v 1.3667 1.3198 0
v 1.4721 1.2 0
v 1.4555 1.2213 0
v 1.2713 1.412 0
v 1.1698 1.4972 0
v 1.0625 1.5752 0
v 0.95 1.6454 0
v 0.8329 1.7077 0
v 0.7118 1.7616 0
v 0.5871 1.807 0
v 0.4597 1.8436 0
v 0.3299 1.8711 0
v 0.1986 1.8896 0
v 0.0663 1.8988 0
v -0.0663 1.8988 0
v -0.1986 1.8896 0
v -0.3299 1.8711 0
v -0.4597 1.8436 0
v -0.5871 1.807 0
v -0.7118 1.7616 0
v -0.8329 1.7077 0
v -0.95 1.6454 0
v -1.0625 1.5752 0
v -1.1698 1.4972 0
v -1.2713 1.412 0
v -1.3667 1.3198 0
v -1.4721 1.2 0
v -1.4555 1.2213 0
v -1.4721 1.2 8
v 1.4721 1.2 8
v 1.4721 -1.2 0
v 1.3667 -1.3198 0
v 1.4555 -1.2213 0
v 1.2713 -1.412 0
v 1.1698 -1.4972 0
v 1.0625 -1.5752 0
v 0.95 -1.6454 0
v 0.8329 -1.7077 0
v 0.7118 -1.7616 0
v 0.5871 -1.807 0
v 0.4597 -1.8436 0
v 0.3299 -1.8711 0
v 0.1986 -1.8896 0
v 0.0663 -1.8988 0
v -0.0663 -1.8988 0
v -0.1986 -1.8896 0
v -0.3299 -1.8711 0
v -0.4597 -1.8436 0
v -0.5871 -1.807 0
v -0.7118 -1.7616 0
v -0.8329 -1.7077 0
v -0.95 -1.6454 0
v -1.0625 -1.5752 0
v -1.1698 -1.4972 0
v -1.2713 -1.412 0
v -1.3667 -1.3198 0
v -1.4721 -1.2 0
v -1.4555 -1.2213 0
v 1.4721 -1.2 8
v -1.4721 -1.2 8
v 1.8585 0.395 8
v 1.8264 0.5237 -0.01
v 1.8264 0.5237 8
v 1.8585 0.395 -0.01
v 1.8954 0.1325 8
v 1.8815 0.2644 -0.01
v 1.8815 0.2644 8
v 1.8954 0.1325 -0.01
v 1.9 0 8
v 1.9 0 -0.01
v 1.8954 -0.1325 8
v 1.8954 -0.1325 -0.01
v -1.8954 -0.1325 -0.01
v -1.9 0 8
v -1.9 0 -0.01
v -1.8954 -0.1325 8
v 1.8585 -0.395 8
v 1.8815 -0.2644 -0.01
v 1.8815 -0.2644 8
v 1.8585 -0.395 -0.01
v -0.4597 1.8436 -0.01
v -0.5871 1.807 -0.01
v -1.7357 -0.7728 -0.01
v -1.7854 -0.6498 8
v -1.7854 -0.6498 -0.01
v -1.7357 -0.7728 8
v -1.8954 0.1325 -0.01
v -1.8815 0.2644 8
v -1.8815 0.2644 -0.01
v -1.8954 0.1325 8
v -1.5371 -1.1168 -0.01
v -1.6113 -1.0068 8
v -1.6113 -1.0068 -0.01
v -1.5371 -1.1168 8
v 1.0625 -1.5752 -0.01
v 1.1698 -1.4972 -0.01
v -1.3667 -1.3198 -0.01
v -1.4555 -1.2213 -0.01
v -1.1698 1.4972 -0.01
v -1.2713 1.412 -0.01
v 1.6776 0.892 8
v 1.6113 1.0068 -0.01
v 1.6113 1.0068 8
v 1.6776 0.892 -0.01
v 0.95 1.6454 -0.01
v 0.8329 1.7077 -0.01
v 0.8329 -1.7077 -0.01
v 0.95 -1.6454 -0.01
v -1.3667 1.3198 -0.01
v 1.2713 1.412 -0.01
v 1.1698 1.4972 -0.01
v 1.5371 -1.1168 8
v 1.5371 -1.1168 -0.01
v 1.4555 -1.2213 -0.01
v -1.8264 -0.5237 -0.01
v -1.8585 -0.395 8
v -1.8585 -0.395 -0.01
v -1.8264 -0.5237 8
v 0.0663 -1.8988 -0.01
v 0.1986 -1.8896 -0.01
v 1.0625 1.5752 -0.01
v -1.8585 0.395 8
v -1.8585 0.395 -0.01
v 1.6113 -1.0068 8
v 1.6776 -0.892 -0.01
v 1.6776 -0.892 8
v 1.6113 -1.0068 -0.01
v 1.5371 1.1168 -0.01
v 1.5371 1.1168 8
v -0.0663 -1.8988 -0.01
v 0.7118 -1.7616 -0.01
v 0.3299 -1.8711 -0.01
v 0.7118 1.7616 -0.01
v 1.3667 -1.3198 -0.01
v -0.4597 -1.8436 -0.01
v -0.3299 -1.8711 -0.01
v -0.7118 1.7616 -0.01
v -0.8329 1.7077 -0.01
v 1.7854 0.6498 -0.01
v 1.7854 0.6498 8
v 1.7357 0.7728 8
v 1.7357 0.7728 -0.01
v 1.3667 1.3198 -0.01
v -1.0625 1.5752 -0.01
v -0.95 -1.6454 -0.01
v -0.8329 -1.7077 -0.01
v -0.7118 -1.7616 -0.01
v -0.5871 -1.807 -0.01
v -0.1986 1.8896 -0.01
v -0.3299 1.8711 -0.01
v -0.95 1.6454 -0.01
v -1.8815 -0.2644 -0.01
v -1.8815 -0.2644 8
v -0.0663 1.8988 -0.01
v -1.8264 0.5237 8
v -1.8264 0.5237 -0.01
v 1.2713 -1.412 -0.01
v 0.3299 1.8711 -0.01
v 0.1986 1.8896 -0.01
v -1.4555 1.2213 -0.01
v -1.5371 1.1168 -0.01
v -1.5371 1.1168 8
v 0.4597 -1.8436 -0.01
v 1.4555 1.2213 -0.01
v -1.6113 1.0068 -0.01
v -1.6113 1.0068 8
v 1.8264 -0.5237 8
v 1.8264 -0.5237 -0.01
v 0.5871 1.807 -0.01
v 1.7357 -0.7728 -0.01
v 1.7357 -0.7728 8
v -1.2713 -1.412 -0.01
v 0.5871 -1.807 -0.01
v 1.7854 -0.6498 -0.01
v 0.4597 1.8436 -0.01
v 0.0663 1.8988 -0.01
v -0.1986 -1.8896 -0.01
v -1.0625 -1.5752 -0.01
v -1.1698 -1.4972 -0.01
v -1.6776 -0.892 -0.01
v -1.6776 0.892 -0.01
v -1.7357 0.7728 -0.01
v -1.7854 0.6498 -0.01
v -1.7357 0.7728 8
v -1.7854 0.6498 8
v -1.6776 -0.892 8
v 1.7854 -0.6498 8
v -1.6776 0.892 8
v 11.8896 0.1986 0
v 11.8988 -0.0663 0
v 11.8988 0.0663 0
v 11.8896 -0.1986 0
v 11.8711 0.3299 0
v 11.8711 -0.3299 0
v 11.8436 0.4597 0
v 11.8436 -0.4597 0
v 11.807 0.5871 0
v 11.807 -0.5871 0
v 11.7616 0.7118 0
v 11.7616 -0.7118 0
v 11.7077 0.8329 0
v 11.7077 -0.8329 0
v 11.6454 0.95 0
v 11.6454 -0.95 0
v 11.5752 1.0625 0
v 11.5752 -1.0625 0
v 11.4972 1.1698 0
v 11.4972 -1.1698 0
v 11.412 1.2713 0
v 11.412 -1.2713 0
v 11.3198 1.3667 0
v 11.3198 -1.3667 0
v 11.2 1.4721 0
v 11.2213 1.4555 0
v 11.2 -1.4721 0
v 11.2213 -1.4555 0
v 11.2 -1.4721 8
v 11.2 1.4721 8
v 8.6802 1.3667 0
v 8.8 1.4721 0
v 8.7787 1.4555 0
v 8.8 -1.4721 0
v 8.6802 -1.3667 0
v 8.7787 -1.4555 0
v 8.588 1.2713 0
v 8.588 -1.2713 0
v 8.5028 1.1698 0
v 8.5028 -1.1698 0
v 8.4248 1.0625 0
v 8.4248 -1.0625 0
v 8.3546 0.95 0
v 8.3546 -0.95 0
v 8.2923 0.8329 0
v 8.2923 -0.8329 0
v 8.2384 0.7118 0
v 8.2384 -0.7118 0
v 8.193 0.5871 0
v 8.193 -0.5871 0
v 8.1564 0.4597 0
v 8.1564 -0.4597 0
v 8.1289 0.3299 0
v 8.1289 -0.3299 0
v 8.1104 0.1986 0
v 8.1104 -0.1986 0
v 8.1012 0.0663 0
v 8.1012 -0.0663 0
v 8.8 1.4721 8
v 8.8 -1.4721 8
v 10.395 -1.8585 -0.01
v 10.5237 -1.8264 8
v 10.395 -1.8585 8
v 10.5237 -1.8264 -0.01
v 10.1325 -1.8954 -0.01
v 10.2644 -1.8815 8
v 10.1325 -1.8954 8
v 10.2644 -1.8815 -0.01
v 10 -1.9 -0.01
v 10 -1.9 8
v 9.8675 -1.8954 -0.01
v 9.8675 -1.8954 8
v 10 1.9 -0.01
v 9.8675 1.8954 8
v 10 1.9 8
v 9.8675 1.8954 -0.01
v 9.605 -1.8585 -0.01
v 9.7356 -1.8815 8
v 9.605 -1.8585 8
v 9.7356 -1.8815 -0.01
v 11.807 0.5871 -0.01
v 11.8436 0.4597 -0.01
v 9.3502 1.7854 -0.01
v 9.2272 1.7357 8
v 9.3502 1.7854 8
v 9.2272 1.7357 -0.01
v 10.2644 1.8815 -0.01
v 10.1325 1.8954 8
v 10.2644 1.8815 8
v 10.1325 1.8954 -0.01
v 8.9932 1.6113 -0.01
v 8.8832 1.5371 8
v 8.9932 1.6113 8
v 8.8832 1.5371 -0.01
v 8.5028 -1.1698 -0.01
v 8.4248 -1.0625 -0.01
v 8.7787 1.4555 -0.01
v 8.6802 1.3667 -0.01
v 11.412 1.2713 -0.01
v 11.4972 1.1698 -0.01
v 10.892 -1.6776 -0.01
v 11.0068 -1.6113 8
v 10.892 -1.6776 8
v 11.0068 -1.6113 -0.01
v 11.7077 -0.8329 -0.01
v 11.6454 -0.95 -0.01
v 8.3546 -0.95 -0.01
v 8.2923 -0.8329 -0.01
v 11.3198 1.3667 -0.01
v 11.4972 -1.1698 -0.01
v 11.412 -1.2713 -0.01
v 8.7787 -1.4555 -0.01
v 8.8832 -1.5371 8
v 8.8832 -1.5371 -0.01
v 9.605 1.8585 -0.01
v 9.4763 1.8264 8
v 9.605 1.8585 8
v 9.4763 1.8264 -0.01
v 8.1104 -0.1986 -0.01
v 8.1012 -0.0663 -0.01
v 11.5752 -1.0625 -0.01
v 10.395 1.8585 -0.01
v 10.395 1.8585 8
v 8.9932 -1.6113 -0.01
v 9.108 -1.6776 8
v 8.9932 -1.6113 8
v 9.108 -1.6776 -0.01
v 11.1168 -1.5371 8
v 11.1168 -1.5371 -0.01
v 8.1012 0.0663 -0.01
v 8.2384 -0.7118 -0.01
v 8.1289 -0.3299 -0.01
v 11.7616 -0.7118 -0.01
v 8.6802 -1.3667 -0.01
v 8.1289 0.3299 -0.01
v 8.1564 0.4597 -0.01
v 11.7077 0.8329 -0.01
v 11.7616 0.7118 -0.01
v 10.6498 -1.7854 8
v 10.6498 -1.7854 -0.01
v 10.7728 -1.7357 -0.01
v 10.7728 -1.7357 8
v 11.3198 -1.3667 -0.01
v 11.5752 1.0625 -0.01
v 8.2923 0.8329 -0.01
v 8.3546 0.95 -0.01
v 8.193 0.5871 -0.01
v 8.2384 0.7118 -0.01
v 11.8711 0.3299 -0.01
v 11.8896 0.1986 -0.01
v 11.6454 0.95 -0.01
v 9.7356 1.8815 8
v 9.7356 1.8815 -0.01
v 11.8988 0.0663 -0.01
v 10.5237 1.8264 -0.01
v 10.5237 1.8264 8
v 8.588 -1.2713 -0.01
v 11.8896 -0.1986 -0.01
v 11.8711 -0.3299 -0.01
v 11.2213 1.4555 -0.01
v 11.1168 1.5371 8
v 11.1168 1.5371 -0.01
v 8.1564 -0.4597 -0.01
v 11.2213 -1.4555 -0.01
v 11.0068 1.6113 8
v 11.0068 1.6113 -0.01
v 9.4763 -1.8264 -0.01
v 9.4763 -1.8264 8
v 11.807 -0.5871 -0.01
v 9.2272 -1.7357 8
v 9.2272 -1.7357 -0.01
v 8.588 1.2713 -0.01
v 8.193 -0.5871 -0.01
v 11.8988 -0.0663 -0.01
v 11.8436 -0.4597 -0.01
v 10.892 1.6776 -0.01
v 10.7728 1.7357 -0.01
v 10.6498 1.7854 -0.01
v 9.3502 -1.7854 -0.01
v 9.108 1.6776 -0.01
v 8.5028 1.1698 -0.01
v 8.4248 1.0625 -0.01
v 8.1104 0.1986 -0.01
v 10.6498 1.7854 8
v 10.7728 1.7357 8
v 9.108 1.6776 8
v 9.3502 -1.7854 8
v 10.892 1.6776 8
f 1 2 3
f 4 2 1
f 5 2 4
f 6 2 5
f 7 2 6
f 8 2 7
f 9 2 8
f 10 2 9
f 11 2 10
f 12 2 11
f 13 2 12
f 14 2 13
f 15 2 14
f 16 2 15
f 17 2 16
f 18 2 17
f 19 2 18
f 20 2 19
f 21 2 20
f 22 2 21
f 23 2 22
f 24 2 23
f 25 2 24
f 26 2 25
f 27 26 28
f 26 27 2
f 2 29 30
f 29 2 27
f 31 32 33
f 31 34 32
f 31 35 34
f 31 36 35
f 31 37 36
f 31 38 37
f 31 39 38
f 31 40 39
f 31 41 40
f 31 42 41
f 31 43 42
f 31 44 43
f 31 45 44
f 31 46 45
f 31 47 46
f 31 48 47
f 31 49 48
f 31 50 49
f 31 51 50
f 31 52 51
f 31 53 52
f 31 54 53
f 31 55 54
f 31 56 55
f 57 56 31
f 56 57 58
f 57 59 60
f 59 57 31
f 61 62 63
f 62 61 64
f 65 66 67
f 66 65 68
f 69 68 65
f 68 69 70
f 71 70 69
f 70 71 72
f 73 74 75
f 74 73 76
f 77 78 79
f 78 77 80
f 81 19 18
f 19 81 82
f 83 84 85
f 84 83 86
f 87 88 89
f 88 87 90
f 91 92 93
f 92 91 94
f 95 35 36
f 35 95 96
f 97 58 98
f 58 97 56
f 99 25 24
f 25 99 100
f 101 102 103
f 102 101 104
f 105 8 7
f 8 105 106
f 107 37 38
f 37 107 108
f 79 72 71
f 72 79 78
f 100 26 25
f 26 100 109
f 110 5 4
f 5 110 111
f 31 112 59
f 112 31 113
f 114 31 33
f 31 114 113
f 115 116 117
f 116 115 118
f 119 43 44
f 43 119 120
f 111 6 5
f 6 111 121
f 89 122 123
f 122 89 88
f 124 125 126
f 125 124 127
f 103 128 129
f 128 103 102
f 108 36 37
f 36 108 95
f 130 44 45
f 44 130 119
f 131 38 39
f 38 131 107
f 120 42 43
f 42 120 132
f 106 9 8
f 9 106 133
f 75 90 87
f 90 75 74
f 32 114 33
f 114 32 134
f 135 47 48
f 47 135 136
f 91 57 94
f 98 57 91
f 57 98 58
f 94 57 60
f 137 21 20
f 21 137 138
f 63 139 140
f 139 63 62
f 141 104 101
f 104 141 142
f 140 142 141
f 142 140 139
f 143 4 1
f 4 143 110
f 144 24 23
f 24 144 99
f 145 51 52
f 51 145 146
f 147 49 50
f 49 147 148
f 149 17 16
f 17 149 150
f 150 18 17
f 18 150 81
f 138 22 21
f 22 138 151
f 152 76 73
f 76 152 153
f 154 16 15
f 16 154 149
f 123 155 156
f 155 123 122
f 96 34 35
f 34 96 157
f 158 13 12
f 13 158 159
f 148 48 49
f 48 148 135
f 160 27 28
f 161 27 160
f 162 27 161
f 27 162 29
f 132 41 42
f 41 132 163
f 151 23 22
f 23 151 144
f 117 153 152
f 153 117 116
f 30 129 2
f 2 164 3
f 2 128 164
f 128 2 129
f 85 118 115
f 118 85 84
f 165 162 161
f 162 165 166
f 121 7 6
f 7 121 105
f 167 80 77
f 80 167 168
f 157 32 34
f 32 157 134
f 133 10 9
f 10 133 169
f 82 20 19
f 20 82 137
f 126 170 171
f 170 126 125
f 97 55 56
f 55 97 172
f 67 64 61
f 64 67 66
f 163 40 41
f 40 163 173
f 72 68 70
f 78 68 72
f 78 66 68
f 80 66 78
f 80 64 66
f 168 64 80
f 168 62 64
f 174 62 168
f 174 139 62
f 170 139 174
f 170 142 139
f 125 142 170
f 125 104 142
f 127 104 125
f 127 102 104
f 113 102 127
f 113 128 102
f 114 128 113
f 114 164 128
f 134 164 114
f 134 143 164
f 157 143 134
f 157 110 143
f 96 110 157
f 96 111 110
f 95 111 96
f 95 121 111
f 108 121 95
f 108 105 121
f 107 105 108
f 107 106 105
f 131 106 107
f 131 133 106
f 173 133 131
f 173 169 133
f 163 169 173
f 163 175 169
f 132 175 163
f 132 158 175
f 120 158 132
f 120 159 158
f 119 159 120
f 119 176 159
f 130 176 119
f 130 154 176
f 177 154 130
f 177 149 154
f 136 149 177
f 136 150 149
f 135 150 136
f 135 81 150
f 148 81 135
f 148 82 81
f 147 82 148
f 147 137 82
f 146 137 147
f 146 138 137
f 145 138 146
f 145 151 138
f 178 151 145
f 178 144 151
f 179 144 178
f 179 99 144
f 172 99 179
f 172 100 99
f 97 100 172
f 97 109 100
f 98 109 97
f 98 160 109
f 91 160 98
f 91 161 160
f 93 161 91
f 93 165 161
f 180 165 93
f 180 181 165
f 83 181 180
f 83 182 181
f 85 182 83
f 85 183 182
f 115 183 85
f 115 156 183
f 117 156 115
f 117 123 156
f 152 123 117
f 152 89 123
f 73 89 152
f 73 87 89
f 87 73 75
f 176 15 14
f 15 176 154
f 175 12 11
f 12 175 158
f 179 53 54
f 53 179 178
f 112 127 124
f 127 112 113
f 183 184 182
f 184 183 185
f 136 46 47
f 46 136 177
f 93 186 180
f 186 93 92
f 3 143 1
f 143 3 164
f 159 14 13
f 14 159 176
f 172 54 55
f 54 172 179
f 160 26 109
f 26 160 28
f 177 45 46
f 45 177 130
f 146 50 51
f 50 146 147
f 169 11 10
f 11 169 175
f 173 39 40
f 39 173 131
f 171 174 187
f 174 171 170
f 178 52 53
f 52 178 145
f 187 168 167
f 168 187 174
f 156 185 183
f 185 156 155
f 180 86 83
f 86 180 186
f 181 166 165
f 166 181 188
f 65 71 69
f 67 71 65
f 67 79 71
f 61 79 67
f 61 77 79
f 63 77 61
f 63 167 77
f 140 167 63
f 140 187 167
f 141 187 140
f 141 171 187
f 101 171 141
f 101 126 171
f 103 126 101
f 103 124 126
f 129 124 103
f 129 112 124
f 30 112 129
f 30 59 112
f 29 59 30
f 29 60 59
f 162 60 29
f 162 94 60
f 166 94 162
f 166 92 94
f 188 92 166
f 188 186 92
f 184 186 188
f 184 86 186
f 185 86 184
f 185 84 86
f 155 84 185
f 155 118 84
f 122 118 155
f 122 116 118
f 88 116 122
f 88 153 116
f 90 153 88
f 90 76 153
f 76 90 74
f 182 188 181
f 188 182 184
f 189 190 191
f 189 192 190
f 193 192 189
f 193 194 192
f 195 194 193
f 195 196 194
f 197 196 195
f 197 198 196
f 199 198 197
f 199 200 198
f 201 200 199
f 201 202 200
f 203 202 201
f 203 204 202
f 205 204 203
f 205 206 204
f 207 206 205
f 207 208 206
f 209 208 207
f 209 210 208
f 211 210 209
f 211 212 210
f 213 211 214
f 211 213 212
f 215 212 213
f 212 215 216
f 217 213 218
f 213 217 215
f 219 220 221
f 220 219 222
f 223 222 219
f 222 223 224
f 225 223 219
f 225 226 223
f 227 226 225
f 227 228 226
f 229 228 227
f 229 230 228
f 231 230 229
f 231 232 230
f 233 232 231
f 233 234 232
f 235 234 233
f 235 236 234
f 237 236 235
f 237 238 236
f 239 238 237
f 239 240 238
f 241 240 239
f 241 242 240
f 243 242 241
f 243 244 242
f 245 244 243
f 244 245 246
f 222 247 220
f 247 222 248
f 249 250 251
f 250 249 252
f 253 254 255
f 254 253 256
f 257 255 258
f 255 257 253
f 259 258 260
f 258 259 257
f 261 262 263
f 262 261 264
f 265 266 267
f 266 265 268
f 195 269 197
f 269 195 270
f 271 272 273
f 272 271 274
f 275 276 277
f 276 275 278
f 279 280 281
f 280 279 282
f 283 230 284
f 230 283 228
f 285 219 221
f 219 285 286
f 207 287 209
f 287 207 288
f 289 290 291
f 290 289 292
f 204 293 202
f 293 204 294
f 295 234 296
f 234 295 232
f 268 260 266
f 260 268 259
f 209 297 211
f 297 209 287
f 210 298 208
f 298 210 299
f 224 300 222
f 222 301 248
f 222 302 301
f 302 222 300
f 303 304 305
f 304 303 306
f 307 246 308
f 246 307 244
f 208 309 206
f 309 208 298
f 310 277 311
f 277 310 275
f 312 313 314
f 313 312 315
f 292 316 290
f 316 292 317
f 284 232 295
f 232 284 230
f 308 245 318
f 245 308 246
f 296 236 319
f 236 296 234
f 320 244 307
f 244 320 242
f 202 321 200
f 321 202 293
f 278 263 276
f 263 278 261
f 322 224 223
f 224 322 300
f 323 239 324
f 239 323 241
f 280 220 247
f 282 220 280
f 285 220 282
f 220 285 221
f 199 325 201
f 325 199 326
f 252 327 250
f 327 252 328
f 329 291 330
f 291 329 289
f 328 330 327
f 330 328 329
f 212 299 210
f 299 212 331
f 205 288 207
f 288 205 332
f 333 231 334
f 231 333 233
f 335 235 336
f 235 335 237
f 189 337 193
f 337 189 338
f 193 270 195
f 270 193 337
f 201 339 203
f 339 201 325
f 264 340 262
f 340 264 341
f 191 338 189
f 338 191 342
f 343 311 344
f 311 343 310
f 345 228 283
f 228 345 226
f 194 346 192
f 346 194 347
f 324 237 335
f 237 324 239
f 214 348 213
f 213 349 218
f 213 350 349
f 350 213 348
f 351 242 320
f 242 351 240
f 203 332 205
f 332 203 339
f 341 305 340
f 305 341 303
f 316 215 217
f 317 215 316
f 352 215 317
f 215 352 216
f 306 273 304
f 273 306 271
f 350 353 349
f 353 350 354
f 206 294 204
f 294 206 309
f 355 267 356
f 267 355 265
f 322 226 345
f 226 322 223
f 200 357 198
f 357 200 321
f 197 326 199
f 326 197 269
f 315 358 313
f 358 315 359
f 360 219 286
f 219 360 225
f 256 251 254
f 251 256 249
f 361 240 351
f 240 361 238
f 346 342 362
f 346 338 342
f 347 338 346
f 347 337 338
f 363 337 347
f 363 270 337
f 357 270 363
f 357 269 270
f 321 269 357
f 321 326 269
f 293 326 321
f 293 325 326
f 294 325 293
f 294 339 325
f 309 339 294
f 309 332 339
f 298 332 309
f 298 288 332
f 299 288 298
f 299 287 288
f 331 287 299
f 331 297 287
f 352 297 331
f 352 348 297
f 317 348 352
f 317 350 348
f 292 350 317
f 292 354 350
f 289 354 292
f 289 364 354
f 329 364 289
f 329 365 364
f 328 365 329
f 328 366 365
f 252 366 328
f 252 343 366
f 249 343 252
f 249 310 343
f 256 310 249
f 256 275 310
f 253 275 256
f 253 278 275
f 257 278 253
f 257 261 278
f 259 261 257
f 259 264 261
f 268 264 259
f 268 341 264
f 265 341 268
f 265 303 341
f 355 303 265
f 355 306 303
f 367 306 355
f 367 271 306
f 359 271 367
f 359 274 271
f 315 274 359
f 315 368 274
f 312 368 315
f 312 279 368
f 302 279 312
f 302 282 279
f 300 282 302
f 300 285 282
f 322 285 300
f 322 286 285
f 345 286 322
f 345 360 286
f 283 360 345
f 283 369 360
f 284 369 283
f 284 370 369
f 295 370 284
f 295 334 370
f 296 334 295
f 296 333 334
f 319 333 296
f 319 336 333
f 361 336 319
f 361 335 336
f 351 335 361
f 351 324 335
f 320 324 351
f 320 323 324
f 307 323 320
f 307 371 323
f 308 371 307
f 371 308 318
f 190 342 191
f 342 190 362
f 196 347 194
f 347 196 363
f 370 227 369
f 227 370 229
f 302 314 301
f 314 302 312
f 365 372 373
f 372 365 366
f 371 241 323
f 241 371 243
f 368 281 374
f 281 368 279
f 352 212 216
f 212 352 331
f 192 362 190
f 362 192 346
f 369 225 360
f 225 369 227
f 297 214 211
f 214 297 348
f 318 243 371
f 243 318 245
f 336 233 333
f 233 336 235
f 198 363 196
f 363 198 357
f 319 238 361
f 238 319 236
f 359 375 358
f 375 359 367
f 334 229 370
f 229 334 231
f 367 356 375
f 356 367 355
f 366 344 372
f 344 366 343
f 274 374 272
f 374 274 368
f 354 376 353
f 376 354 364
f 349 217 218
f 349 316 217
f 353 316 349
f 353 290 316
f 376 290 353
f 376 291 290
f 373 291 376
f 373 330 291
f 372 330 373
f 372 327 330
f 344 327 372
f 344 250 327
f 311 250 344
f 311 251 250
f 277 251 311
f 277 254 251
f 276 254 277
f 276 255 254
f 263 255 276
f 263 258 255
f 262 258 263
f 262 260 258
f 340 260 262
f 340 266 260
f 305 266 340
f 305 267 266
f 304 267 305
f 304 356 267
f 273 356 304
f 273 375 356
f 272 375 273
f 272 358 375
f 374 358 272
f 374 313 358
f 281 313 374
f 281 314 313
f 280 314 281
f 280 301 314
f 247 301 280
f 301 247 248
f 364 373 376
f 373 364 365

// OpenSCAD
// file: ../../Base/Boxes.scad
// Fischertechnik Box Foundation
// Pre-designed Boxes

use <Constants.scad>

include <PlacementOptions.scad>

box190Width = 190;
box190Depth = 130;
box130Width = 130;
box130Depth = 95;

// Values are from an original ec3 box
topBottomDifference = 1.5;
outerHeight = 40;
baseThickness = 1.8;
innerHeight = outerHeight - baseThickness;
stackExcess = 5.7;
radius = 3.5;
wallThickness = 1.5;
tolerance = 0.2;

boxWallThickness = wallThickness;
boxBaseThickness = baseThickness;
boxWebWidth = 3.0;

// getBoxWallThickness()
// Gets the wall thickness of a Fischertechnik Box
function getBoxWallThickness() = boxWallThickness;

// getBoxUsageHeight(height = 38.2)
// Gets the usable height of a Fischertechnik box
// height = Outer height of the box from the bottom to the upper edge.
function getBoxUsageHeight(height = outerHeight) = height - baseThickness - stackExcess;

// getBoxInnerHeight()
// Gets the inner height of a Fischertechnik box, including the stack excess
function getBoxInnerHeight() = innerHeight;

// getBoxBaseThickness()
// Gets the thickness of the Fischertechnik box base.
function getBoxBaseThickness() = boxBaseThickness;

// getBoxWebWidth()
// Gets the width of a box web
function getBoxWebWidth() = boxWebWidth;

// getBox190Space()
// Gets the usable inner space of a Box 190 as an x/y-list
function getBox190Space() = [
    box190Width - 2*getBoxWallThickness() - topBottomDifference, 
    box190Depth - 2*getBoxWallThickness() - topBottomDifference ];

// RoundedCornerPlate(width, depth, height, radius)
// Creates a body plate with rounded corners for a box. Used
// also to create the complete box with the hull module.
// width = Width of the plate
// depth = depth of the plate 
// height = thickness of the plate
// radius = radius of the rounded corner
module RoundedCornerPlate(width, depth, height, radius) {
    translate([radius, radius])
    hull() {
        w = width-2*radius;
        d = depth-2*radius;
        cube([w, d, height]);
        cylinder(height, r=radius, $fn=getFragments());
        translate([w, 0])
            cylinder(height, r=radius, $fn=getFragments());
        translate([w, d])
            cylinder(height, r=radius, $fn=getFragments());
        translate([0, d])
            cylinder(height, r=radius, $fn=getFragments());
    }
}

// BoxBase(width, depth)
// Creates an empty stackable Fischertechnik compatible box
// width = Outer width of the box (190, 130, ...)
// depth = Outer depth of the box (130, 95, ...)

module BoxBase(width, depth, height=outerHeight) {    
    thinPlate = 0.01;

    innerHeight = height - baseThickness;    
    
    module Body(tolerance=tolerance) {
        hull() {
            // Bottom with tolerance to fit into the original boxes when stacked
            translate([-wallThickness+tolerance, -wallThickness+tolerance, -baseThickness])
                RoundedCornerPlate(width-topBottomDifference-2*tolerance, depth-topBottomDifference-2*tolerance, thinPlate, radius);
            
            // Top
            translate([-wallThickness-topBottomDifference/2, -wallThickness-topBottomDifference/2, innerHeight-thinPlate])
                RoundedCornerPlate(width, depth, thinPlate, radius);
         }
    }

    module Cutoff() {
        hull() {
            coWidth = width - 2*wallThickness;
            coDepth = depth - 2*wallThickness;
            
            // Bottom
            RoundedCornerPlate(coWidth-topBottomDifference, coDepth-topBottomDifference, thinPlate, radius);

            // Top
            translate([-topBottomDifference/2, -topBottomDifference/2, innerHeight+thinPlate]) 
                RoundedCornerPlate(coWidth, coDepth, thinPlate, radius);
        }
    }
    
    difference() {        
        Body();
        Cutoff();
        stackOffset = innerHeight - stackExcess;
        translate([0, 0, stackOffset + baseThickness])
            Body(tolerance=0);
    }
}

// Creates the Fischertechnik empty box 130x190 mm and places it at position 0,0
// 190x130 are the outer sizes, the inner space is slightly smaller. Use getBox190Space() to get the inner sizes.
// The box is positioned that the usable inner space is at the 0,0,0 position.

module Box190() {
    BoxBase(box190Width, box190Depth);
}

// Gets the usable inner space of a Box 130 as an x/y-list
function getBox130Space() = [
    box130Width - 2*getBoxWallThickness() - topBottomDifference, 
    box130Depth - 2*getBoxWallThickness() - topBottomDifference ];

// Creates the Fischertechnik empty box 95x130 mm and places it at position 0,0
// 190x130 are the outer sizes, the inner space is slightly smaller. Use getBox190Space() to get the inner sizes.
// The box is positioned that the usable inner space is at the 0,0,0 position.

module Box130() {
    BoxBase(box130Width, box130Depth);
}

// Creates a web at the specified box walls
// corner 0 = LowerLeft, 1 = UpperLeft, 2 = UpperRight, 3 = LowerRight
// side 0 = LeftOfCorner, 1 = RightOfCorner
// distance = Distance in mm from the corner
// boxSpace = inner width and depth of the box (default: Box 190)
// webWidth = length of the web (default is 3 mms)
// webThickness = thickness of the web (default is 1 mm)
// height = Height of the web (standard is getBoxUsageHeight())
// sink = How much of the web is sunk into the wall

module BoxWeb(
    corner, 
    side, 
    distance, 
    boxSpace=getBox190Space(), 
    webWidth=getBoxWebWidth(), 
    webThickness=1.0, 
    height=getBoxUsageHeight(),
    sink = getBoxWallThickness()/2) {
    width = (corner % 2 == 0) ? 
            (side == LeftOfCorner ? webWidth : webThickness) :
            (side == LeftOfCorner ? webThickness : webWidth);

    depth = (corner % 2 == 0) ? 
            (side == RightOfCorner ? webWidth : webThickness) :
            (side == RightOfCorner ? webThickness : webWidth);
    
    xDiff = corner == LowerLeft ? 
                (side == LeftOfCorner ? -sink : distance) :
            (corner == UpperLeft ?                
                (side == LeftOfCorner ? distance : -sink) :
            (corner == UpperRight ?
                (side == LeftOfCorner ? boxSpace.x-webWidth+sink : boxSpace.x-distance-webThickness) :
                (side == LeftOfCorner ? boxSpace.x-distance-webThickness: boxSpace.x-webWidth+sink)));

    yDiff = corner == LowerLeft ? 
                (side == RightOfCorner ? -sink : distance) :
            (corner == UpperLeft ?
                (side == RightOfCorner ? boxSpace.y-distance-webThickness : boxSpace.y-webWidth+sink) :
            (corner == UpperRight ?
                (side == RightOfCorner ? boxSpace.y-webWidth+sink : boxSpace.y-distance-webThickness) :
                (side == RightOfCorner ? distance : -sink)));
    
    translate([xDiff, yDiff, -getExcess()])
        cube([width, depth, height + 2*getExcess()]);
}
// file: ../../Base/Rotation.scad
// Fischertechnik Box Foundation
// Geometry Helpers Rotation

include <PlacementOptions.scad>

// getRotatedSpace(space, rotation=NoRotation)
// Rotates the space dependent on the specified rotation

function getRotatedSpace(space, rotation=NoRotation) = [
    (rotation == Rotate90 || rotation == Rotate270) ? space.y : space.x,
    (rotation == Rotate90 || rotation == Rotate270) ? space.x : space.y
];

// Rotates the given space around the fixed left lower corner
// space = the space the children needs as width/depth list [width,depth]
// rotation = 0 Rotate0 degrees, 1 Rotate90 degrees, 2 Rotate180 degrees, 3 Rotate270 degrees (equivalent to -90)

module RotateFix(space, rotation=NoRotation) {
    dy = (rotation == Rotate0 || rotation == Rotate270) ? 0 :
        (rotation == Rotate90) ? space.x :
        space.y;
    dx = (rotation < Rotate180) ? 0 :
        (rotation == Rotate180) ? space.x :
        space.y;
    
    translate([dx, dy, 0])
        rotate([0, 0, rotations[rotation]])
            children();
}
// file: ../../Base/Alignment.scad
// Fischertechnik Box Foundation
// Geometry Helpers Alignment

include <PlacementOptions.scad>

// getAlignedX(elementWidth, spaceWidth, align=AlignRight, offset=0)
// Gets the aligned X offset of an element with the given
// width in the given space.
// elementWidth = The width of the element to positon
// spaceWidth = The space where the element should be aligned
// align = 0 AlignLeft, 1 AlignCenter, 2 AlignRight
// offset = an optional offset from the aligned position. When
// aligned left or centered, then positive values are in X direction.
// When aligned right then positive values are in negative X direction.

function getAlignedX(elementWidth, spaceWidth, align=AlignRight, offset=0) =
    (align == AlignLeft) ?
        offset :
        ((align == AlignCenter) ?
        (spaceWidth - elementWidth)/2 + offset :
        spaceWidth - offset - elementWidth);

// getAlignedY(elementDepth, spaceDepth, align=AlignTop, offset=0)
// Gets the aligned Y offset of an element with the given
// depth in the given space.
// elementDepth = The depth of the element to positon
// spaceDepth = The space where the element should be aligned
// align = 0 AlignBottom, 1 AlignCenter, 2 AlignTop
// offset = an optional offset from the aligned position. When
// aligned bottom or centered, then positive values are in Y direction.
// When aligned top then positive values are in negative Y direction.

function getAlignedY(elementDepth, spaceDepth, align=AlignTop, offset=0) =
    (align == AlignBottom) ?
        offset :
        ((align == AlignCenter) ?
        (spaceDepth - elementDepth)/2 + offset :
        spaceDepth - offset - elementDepth);
// file: ../../Base/Constants.scad
// Fischertechnik Box Foundation
// Constants

// Constant values necessary for multiple elements

// Base constants
dividerThickness = 1.2;
excess = 0.01;
fragments = 90;
tolerance = 0.8;

// Gets the thickness of a divider 
function getDividerThickness() = dividerThickness;

// Gets the excess that is used to merge walls into each other
function getExcess() = excess;

// Gets amount of fragments of a cylinder
function getFragments() = fragments;

// Gets the inner tolerance of a frame to each side
function getTolerance() = tolerance;


// Fischertechnik specific constants
axisDiameter = 4;
axisBottomDiameter = axisDiameter + 1;
axisTolerance = 0.2;
axisLockingLength = 8;

// Gets axis diameter of Fischertechnik axis
function getAxisDiameter() = axisDiameter;

// Gets axis diameter tolerance (subtracted for element axis)
function getAxisTolerance() = axisTolerance;

// Gets the axis diameter for standing axis
function getStandAxisDiameter() = getAxisDiameter() - getAxisTolerance();

// Gets axis bottom diameter for thicker part at the bottom
function getAxisBottomDiameter() = axisBottomDiameter;

// Gets the lengthh of the locking part of a locking axis
function getAxisLockingLength() = axisLockingLength;

pinHeight = 2.5;
pinTolerance = 0.2;

// gets the height of a connecting pin
function getPinHeight() = pinHeight;

// gets the connecting pin height tolerance
function getPinTolerance() = pinTolerance;

standardEdgeDistance = 2.5;
standardWebDistance = 11.5;
standardCornerLength = 15;

// gets the standard distance to the wall of the box for dockable frames with webs
function getStandardEdgeDistance() = standardEdgeDistance;

// gets the standard distance of each web to the corner of the dockable frame
function getStandardWebDistance() = standardWebDistance;

// gets the standard length of the corner walls of a dockable frame
function getStandardCornerLength() = standardCornerLength;

tubeWallFactor = 0.8;

// gets the wall thickness of a tube.
function getTubeWallThickness() = tubeWallFactor * getDividerThickness();

smallPartsFrameHeight = 20;

// gets the frame height for docked small parts boxes.
function getSmallPartsFrameHeight() = smallPartsFrameHeight;

hubRingDiameter = 19.5;
hubRingLevelDiameter = 21;

// gets the diameter of a tube matching the inner ring of a wheel
function getHubRingDiameter() = hubRingDiameter;

// gets the diameter of a hub tube with a thicker diameter
function getHubRingLevelDiameter() = hubRingLevelDiameter;
// file: ../../Base/PlacementOptions.scad
// Fischertechnik Box Foundation
// Placement Options

// Alignment
NoAlign = 0;
AlignLeft = 1;
AlignBottom = 2;
AlignCenter = 3;
AlignRight = 4;
AlignTop = 5;

// Element rotation degree steps
rotations = [0, -90, -180, -270];

// Rotation
NoRotation = 0;
Rotate0 = 0;
Rotate90 = 1;
Rotate180 = 2;
Rotate270 = 3;

// Docking (seen from above)
NoDock = -1;
DockLeft = 0;
DockTop = 1;
DockRight = 2;
DockCorner = 2;
DockBottom = 3;

// Web corners
LowerLeft = 0;
UpperLeft = 1;
UpperRight = 2;
LowerRight = 3;

// Web position relative to corner
LeftOfCorner = 0;
RightOfCorner = 1;

// Rails direction
Horizontal = true;
Vertical = false;
// file: ../../Base/Placement.scad
// Fischertechnik Box Foundation
// Geometry Helpers Placement

use <Constants.scad>
use <Alignment.scad>
use <Rotation.scad>
use <Boxes.scad>

include <PlacementOptions.scad>

// Place(x=0, y=0, elementSpace=[0,0], alignX=AlignLeft, alignY=AlignBottom, rotation=Rotate0, boxSpace=getBox190Space())
// Places the child at the specified position
// y = Y-Position. This is a relative position when an X aligment is specified.
// x = X-Position. This is a relative position when an Y aligment is specified.
// elementSpace = space of the element to be placed [x,y]
// alignX = -1=NoAlign, 0 AlignLeft, 1 AlignCenter, 3 AlignRight (elementSpace and boxSpace required!)
// alignY = -1=NoAlign, 2 AlignBottom, 1 AlignCenter, 4 AlignTop (elementSpace and boxSpace required!)
// rotation = 0 Rotate0 0 degrees, 1 Rotate90 90 degrees, 
// 2 Rotate180 180 degrees, 3 Rotate270 270 degrees (equivalent to -90)
// boxSpace = Inner space of the box where the placement occurs [x,y] - default is Box 190x130 inner space

module Place(x=0, y=0, elementSpace=[0,0], 
  alignX=AlignLeft, alignY=AlignBottom, 
  rotation=NoRotation, boxSpace=getBox190Space()) {

    module Position(x, y, space, rotation=Rotate0) {
        translate([x, y, 0])
            RotateFix(space, rotation)
                children();
    }

    space = getRotatedSpace(elementSpace, rotation);
    alignedX = getAlignedX(space.x, boxSpace.x, alignX, x);
    alignedY = getAlignedY(space.y, boxSpace.y, alignY, y);
    Position(alignedX, alignedY, elementSpace, rotation)
        children();
}

// Center(space=getBox130Space(), elementSpace=[0,0])
// space = Space where the children is centered. For cylinder use centered=true and no elementSpace.
// elementSpace = space of the element to be centered [x,y]

module Center(space=getBox190Space(), elementSpace=[0,0]) {
    Place(elementSpace=elementSpace, boxSpace=space, alignX=AlignCenter, alignY=AlignCenter)
        children();
}

// CenterHorizontal(width=0, y=0, offset=0, space=getBox130Space())
// width = Width of the element to be placed.
// y = Y position of the element
// offset = Offset from the center position (negative will be left of the center)
// space = Space where the element is placed

module CenterHorizontal(width=0, y=0, offset=0, space=getBox190Space()) {
    Place(x=offset, y=y, elementSpace=[width, 0], boxSpace=space, alignX=AlignCenter)
        children(0);
}

// CenterVertical(depth=0, x=0, offset=0, space=getBox130Space())
// depth = Depth of the element to be placed.
// x = X position of the element
// offset = Offset from the center position (negative will be down of the center)
// space = Space where the element is placed

module CenterVertical(depth=0, x=0, offset=0, space=getBox190Space()) {
    Place(x=x, y=offset, elementSpace=[0, depth], boxSpace=space, alignY=AlignCenter)
        children(0);
}

// getIsVertical(align)
// True if the specified alignment needs a vertical orientation for a divider (AlignRight, AlignLeft)

function getIsVertical(align) = (align == AlignRight || align == AlignLeft);

// getIsHorizontal(align)
// True if the specified alignment needs a horizontal orientation for a divider (AlignTop, AlignBottom)

function getIsHorizontal(align) = (align == AlignTop || align == AlignBottom);
// main file
// Fischertechnik Box Foundation
// ModelBase
// Test Axis

use <../../Base/Placement.scad>
use <../../ModelBase/Simple.scad>

include <../../Base/PlacementOptions.scad>

LockingAxis();

Place(10, rotation=Rotate90)
    LockingAxis();
